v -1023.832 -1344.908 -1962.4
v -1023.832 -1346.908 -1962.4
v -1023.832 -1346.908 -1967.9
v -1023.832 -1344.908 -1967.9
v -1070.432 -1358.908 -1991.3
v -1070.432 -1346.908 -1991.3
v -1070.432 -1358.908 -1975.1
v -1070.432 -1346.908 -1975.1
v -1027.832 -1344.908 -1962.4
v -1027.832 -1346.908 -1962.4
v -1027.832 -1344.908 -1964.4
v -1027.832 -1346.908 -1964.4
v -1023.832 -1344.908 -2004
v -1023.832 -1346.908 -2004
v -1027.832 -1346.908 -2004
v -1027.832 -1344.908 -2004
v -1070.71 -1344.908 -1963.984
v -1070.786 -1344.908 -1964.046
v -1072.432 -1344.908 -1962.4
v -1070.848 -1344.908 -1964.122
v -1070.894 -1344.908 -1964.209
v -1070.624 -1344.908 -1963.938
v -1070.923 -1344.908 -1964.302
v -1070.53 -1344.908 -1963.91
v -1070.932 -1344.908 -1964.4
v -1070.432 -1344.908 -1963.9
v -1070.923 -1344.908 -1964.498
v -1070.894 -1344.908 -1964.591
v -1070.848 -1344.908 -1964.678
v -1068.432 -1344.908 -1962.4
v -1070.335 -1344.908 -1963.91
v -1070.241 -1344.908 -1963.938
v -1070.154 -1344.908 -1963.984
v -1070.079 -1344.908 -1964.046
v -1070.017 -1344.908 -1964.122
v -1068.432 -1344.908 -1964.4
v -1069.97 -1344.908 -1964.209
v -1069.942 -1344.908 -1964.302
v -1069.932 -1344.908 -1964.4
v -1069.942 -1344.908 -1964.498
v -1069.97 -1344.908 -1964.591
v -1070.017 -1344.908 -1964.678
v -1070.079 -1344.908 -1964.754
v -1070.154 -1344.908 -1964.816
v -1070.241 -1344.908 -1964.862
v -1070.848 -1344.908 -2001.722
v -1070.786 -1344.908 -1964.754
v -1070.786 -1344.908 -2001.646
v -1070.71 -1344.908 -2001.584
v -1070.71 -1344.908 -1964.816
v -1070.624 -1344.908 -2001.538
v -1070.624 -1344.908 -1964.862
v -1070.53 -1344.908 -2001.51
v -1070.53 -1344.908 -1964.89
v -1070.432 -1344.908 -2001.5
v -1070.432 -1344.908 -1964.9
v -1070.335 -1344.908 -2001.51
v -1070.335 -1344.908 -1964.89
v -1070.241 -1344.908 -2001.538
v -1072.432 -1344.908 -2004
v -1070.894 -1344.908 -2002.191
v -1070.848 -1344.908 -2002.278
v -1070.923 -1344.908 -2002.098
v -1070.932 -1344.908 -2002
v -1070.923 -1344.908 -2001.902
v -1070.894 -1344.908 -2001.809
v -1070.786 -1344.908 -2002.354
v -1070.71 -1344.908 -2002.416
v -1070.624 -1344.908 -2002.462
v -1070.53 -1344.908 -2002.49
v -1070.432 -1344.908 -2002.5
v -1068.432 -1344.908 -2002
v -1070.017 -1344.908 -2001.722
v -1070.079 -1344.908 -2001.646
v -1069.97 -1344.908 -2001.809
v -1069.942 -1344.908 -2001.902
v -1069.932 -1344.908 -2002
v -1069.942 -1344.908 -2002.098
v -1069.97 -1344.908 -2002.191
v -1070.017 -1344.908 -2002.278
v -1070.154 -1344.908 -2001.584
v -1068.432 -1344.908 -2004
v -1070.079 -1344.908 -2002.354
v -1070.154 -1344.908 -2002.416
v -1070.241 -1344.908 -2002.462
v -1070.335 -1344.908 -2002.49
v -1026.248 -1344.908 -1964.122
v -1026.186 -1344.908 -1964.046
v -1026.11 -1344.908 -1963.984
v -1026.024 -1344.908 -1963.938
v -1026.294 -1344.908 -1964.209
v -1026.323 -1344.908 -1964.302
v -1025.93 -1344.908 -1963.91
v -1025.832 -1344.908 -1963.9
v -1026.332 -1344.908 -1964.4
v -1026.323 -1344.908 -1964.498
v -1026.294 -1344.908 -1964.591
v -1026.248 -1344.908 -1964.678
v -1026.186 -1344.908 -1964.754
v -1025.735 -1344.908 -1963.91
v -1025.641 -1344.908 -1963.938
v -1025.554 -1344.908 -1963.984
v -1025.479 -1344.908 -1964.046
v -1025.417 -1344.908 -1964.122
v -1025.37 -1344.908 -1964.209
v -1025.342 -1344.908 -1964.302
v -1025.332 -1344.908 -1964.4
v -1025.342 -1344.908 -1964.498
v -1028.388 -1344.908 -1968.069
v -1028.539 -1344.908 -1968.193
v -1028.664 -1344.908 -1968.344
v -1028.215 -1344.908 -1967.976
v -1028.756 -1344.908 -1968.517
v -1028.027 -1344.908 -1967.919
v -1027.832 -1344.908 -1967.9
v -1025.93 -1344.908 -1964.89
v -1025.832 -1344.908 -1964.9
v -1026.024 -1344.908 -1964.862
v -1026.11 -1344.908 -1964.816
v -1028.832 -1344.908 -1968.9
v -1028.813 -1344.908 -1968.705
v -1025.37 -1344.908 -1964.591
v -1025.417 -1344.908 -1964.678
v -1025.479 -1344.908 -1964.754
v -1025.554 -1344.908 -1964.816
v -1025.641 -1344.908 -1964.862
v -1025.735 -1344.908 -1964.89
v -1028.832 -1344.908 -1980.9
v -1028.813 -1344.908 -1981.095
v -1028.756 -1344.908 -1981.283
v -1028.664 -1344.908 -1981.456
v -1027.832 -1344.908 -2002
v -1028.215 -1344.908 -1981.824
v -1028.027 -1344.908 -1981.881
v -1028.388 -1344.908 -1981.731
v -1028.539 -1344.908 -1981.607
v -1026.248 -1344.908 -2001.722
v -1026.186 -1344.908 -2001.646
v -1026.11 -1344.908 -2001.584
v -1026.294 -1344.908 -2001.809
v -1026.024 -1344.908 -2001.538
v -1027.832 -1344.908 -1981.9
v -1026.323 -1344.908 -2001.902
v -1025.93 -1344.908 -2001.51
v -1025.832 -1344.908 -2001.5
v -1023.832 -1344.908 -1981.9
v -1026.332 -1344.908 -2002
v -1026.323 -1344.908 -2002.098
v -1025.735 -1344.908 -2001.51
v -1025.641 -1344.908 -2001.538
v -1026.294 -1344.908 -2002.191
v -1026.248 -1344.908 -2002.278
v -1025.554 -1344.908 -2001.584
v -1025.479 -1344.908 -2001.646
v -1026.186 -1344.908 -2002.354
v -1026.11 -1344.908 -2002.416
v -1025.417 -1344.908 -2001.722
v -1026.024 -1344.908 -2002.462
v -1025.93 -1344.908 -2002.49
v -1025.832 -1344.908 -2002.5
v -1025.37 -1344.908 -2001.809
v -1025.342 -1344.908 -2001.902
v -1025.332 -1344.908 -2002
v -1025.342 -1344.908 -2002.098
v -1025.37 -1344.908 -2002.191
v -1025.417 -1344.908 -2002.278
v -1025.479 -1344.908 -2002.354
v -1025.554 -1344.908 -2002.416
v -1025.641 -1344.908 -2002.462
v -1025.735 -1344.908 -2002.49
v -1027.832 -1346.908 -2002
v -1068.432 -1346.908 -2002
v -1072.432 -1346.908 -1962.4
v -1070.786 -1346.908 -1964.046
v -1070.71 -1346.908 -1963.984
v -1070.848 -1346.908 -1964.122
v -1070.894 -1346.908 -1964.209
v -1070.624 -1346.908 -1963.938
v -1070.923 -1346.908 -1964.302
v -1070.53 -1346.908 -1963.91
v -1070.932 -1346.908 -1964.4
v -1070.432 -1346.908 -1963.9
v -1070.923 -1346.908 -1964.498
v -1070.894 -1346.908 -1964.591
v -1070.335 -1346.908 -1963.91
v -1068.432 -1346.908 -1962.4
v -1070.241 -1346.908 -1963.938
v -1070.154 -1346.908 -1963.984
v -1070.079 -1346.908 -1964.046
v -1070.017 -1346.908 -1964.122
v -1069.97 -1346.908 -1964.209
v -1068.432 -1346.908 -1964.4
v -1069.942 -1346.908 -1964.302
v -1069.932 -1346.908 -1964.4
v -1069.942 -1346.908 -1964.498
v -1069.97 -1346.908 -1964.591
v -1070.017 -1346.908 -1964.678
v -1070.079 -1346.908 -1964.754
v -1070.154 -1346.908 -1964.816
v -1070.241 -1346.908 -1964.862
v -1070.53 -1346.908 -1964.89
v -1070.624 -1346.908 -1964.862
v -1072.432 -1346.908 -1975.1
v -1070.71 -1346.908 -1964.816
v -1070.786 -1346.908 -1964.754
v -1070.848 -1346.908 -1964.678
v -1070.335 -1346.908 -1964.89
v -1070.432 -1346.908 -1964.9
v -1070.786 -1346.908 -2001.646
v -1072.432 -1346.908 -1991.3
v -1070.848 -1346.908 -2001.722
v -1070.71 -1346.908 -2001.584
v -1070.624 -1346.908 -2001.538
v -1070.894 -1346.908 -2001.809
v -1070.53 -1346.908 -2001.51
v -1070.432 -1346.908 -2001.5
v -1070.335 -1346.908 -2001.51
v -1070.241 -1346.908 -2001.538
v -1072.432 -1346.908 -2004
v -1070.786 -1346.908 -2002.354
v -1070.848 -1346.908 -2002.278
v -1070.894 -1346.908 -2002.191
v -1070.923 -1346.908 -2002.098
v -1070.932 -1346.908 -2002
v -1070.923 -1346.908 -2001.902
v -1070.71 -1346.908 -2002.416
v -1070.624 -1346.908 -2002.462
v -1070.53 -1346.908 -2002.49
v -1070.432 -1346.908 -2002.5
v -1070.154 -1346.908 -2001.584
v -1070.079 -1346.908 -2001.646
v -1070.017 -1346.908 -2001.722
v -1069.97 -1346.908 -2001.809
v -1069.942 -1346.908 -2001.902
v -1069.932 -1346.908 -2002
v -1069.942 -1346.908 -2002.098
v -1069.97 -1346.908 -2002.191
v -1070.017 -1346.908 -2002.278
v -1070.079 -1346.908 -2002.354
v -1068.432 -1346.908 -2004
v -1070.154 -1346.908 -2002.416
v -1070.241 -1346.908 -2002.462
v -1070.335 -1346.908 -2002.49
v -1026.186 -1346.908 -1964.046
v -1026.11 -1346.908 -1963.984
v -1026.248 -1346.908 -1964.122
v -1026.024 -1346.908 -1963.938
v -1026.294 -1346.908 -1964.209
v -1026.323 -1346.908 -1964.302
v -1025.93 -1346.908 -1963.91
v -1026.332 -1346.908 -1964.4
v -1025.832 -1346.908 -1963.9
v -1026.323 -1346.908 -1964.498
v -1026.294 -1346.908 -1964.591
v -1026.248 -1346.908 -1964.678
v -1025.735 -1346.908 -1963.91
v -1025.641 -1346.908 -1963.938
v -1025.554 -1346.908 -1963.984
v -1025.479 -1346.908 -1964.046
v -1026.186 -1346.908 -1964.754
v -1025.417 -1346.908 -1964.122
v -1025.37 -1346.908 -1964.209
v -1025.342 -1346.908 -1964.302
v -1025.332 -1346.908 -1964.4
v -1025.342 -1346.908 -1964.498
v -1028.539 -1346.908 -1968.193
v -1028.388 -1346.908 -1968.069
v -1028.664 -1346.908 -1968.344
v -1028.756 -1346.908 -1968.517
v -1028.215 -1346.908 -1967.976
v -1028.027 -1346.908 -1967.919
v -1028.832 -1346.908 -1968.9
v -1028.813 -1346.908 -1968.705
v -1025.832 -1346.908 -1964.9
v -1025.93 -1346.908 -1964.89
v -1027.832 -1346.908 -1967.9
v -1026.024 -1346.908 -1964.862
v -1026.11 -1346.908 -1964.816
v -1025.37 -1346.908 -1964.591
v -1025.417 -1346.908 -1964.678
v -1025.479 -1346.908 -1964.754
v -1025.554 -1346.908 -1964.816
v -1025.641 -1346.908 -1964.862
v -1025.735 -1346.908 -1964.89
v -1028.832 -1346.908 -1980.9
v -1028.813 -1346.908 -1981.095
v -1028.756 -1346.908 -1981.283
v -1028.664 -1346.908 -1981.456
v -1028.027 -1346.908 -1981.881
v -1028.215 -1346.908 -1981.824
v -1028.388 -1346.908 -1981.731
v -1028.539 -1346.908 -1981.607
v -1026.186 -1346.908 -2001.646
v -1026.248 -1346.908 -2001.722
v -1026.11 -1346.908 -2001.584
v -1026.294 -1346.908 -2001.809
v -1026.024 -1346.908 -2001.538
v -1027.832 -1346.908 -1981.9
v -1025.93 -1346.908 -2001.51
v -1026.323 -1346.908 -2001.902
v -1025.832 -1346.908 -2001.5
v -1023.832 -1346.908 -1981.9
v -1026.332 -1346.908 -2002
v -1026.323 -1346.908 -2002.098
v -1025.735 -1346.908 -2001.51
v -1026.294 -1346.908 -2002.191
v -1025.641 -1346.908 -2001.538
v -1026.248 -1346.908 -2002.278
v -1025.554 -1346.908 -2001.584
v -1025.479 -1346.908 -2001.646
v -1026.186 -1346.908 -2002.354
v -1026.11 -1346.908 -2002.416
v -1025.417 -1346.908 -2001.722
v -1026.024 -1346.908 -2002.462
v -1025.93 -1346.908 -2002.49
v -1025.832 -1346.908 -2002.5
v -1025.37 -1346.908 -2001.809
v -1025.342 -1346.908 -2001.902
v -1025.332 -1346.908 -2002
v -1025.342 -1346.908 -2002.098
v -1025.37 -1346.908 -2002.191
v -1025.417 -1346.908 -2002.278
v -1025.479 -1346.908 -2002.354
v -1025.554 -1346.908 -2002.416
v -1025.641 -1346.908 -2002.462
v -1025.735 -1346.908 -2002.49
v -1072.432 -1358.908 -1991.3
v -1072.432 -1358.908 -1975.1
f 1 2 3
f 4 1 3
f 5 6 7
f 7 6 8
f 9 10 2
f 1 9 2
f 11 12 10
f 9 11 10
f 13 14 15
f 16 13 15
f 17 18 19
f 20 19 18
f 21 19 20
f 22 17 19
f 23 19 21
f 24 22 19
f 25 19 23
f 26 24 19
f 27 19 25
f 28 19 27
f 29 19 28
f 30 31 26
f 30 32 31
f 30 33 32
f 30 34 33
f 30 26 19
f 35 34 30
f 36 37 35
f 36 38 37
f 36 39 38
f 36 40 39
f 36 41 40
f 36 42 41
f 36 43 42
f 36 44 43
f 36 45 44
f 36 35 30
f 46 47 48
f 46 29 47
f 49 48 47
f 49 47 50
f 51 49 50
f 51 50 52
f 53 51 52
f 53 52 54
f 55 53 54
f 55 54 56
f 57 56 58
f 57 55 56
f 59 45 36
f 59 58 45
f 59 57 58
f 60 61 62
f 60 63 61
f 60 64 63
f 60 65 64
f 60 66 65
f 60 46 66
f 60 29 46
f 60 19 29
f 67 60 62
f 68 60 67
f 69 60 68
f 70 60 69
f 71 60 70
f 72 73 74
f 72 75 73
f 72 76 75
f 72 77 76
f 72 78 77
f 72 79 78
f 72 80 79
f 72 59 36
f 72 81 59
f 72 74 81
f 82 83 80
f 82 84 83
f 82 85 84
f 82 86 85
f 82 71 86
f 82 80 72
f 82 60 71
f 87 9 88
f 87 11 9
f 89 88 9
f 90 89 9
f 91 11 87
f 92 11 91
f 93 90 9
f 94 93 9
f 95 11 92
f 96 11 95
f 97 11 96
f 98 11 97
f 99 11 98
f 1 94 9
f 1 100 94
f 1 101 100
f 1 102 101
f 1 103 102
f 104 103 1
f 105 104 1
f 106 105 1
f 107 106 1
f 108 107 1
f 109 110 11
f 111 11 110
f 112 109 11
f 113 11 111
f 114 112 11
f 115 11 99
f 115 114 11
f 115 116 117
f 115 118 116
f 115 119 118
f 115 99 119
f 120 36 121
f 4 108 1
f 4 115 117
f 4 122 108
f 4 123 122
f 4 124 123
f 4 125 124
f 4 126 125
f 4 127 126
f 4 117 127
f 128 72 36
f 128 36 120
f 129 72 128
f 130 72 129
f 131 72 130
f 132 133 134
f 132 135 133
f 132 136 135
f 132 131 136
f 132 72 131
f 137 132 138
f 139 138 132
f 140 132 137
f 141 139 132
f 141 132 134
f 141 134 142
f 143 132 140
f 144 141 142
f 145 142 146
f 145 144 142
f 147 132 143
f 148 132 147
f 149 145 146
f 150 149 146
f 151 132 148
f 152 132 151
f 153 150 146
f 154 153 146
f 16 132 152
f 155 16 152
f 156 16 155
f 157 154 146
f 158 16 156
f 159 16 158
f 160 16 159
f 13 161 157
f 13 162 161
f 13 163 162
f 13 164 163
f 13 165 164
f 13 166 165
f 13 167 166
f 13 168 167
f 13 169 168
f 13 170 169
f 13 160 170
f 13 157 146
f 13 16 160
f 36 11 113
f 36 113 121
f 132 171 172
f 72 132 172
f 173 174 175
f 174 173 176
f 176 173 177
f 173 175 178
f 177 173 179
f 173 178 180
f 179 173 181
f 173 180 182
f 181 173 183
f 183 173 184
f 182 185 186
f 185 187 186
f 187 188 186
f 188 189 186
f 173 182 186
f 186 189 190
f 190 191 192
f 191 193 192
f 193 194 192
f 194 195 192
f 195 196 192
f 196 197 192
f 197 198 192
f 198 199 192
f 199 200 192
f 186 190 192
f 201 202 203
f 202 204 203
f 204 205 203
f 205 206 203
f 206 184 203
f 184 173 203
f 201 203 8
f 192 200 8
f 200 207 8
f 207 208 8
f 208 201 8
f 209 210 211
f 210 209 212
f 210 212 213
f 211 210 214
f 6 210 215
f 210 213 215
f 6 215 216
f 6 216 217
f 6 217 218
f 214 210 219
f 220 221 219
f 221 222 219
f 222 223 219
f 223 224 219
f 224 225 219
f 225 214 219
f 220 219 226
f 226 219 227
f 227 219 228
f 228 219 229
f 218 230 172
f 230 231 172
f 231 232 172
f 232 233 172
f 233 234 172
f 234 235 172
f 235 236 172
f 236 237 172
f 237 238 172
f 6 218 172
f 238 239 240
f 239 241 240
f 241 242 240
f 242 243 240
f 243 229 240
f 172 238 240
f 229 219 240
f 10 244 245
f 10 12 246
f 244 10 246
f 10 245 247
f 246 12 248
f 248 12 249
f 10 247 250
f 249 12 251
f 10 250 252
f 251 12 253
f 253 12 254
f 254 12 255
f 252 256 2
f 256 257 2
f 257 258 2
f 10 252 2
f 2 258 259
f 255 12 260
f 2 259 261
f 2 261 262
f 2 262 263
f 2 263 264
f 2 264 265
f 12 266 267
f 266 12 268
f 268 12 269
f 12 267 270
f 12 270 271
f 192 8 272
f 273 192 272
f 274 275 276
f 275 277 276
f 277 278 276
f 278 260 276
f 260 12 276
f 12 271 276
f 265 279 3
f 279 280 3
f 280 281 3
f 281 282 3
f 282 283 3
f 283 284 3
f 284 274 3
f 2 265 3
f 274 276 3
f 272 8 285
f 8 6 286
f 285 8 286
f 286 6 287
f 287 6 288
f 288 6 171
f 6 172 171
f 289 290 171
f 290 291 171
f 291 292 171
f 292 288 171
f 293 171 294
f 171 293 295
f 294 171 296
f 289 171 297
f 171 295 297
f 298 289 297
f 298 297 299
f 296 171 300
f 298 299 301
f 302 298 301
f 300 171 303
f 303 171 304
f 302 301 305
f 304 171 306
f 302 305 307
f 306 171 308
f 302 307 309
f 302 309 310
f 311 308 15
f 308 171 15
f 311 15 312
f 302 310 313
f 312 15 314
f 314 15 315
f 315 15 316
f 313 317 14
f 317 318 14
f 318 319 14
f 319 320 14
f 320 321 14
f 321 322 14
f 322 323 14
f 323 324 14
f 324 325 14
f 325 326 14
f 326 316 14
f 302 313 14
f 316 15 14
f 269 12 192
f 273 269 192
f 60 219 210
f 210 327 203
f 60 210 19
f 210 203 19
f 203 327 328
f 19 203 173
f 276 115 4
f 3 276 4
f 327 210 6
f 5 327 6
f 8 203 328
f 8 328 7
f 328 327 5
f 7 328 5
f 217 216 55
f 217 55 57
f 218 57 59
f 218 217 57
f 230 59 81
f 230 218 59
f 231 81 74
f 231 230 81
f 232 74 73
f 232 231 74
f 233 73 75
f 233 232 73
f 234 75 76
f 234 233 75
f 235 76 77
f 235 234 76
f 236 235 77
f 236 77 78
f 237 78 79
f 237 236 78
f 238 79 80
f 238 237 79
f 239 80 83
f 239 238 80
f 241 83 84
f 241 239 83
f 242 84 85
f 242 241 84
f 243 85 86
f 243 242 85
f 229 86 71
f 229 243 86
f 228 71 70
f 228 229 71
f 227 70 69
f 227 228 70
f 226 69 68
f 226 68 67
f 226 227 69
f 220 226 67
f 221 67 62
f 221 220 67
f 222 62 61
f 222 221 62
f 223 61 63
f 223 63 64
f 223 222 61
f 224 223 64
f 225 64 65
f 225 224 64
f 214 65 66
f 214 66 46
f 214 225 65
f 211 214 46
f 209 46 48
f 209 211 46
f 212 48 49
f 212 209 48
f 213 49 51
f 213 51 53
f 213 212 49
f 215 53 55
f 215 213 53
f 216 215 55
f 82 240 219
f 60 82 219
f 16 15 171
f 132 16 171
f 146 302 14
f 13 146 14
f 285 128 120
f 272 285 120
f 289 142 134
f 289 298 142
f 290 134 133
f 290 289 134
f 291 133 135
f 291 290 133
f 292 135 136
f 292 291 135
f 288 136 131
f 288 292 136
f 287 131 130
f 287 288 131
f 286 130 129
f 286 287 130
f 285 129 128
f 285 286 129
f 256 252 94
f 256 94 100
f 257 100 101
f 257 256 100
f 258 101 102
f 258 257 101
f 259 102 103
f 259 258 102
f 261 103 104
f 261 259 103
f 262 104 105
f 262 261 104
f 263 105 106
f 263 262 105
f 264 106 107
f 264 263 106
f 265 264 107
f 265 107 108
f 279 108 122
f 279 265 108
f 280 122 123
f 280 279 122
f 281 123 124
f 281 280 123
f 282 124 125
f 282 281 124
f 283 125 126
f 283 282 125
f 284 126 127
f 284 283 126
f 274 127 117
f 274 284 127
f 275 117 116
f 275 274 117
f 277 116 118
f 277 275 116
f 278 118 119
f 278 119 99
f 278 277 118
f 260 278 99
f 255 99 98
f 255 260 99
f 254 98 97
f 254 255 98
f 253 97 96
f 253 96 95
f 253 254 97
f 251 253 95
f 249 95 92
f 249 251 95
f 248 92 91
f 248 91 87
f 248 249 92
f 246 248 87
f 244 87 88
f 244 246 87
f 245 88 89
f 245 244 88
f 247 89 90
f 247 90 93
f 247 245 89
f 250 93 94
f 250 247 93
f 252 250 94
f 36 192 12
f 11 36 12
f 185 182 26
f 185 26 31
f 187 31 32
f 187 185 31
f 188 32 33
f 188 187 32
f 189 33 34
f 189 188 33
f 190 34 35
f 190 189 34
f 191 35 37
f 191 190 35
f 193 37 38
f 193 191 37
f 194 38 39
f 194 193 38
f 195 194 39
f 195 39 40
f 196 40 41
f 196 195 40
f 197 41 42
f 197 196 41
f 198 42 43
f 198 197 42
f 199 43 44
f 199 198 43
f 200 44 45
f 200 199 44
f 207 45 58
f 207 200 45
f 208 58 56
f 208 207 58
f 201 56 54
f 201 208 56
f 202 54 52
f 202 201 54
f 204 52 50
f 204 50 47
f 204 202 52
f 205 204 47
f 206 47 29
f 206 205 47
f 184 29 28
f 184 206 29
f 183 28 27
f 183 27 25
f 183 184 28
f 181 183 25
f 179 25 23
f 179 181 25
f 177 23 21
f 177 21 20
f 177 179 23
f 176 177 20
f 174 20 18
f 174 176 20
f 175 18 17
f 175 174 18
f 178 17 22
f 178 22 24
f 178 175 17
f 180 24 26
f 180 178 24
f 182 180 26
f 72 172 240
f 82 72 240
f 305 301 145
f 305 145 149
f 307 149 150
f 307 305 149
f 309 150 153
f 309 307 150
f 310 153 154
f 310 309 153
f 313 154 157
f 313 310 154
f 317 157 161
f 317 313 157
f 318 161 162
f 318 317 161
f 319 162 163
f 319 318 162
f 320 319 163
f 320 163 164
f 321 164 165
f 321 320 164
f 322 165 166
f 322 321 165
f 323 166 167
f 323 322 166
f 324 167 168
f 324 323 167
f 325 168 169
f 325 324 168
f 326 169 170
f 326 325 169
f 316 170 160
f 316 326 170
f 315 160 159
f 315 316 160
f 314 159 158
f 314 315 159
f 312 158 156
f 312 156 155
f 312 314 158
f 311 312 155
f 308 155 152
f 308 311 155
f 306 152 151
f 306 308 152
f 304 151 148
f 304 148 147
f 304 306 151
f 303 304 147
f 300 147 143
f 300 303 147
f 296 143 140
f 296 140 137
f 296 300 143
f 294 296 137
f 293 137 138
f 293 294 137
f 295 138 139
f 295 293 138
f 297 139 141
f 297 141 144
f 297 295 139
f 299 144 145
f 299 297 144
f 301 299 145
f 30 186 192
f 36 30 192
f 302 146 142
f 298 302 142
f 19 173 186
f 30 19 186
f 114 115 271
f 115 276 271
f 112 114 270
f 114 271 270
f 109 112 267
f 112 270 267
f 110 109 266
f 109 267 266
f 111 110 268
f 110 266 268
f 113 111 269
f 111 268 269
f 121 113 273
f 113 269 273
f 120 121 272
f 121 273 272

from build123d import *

# Parameters (mm, degrees)
SKETCH1_R           = 0.5
BOSS_EXTRUDE1_DEPTH = 2
CUT_EXTRUDE1_DEPTH  = 2
FILLET1_R           = 1
SKETCH4_W           = 2
SKETCH4_H           = 16.2
BOSS_EXTRUDE2_DEPTH = 12


with BuildPart() as part:
    # Sketch1 → Boss-Extrude1 (new body)
    # profile 1 of 3: a face of its own
    with BuildSketch(Plane(origin=(0, -1346.908376945, 0), x_dir=(1, 0, 0), z_dir=(0, 1, 0))):
        Polygon((-1025.832273514, 2000), (-1025.832273514, 1981.9), (-1023.832273514, 1981.9), (-1023.832273514, 2004), (-1027.832273514, 2004), (-1027.832273514, 2002), (-1068.432273514, 2002), (-1068.432273514, 2004), (-1072.432273514, 2004), (-1072.432273514, 1991.5), (-1070.432273514, 1991.5), (-1070.432273514, 2000), align=None)
        with Locations(Location((-1070.432273514, 2002, 0), (0, 0, 270))):
            Circle(SKETCH1_R, mode=Mode.SUBTRACT)
        with Locations(Location((-1025.832273514, 2002, 0), (0, 0, 270))):
            Circle(SKETCH1_R, mode=Mode.SUBTRACT)
    # profile 2 of 3: a face of its own
    with BuildSketch(Plane(origin=(0, -1346.908376945, 0), x_dir=(1, 0, 0), z_dir=(0, 1, 0))):
        Polygon((-1023.832273514, 1981.9), (-1023.832273514, 1967.9), (-1025.832273514, 1967.9), (-1025.832273514, 1966.4), (-1070.432273514, 1966.4), (-1070.432273514, 1974.9), (-1072.432273514, 1974.9), (-1072.432273514, 1991.5), (-1070.432273514, 1991.5), (-1070.432273514, 2000), (-1025.832273514, 2000), (-1025.832273514, 1981.9), align=None)
    # profile 3 of 3: a face of its own
    with BuildSketch(Plane(origin=(0, -1346.908376945, 0), x_dir=(1, 0, 0), z_dir=(0, 1, 0))):
        Polygon((-1027.832273514, 1962.4), (-1023.832273514, 1962.4), (-1023.832273514, 1967.9), (-1025.832273514, 1967.9), (-1025.832273514, 1966.4), (-1070.432273514, 1966.4), (-1070.432273514, 1974.9), (-1072.432273514, 1974.9), (-1072.432273514, 1962.4), (-1068.432273514, 1962.4), (-1068.432273514, 1964.4), (-1027.832273514, 1964.4), align=None)
        with Locations(Location((-1025.832273514, 1964.4, 0), (0, 0, 270))):
            Circle(SKETCH1_R, mode=Mode.SUBTRACT)
        with Locations(Location((-1070.432273514, 1964.4, 0), (0, 0, 270))):
            Circle(SKETCH1_R, mode=Mode.SUBTRACT)
    extrude(amount=BOSS_EXTRUDE1_DEPTH)

    # Sketch3 → Cut-Extrude1 (cut)
    with BuildSketch(Plane(origin=(0, -1344.908376945, 0), x_dir=(1, 0, 0), z_dir=(0, 1, 0))):
        Polygon((-1028.832273514, 1967.9), (-1025.832273514, 1967.9), (-1023.832273514, 1967.9), (-1023.832273514, 1981.9), (-1025.832273514, 1981.9), (-1028.832273514, 1981.9), align=None)
    extrude(amount=-CUT_EXTRUDE1_DEPTH, mode=Mode.SUBTRACT)

    # Fillet1
    fillet1_edges = [part.edges().sort_by_distance(p)[0] for p in [
        (-1028.832273514, -1345.908376945, -1967.9),
        (-1028.832273514, -1345.908376945, -1981.9),
    ]]
    fillet(fillet1_edges, radius=FILLET1_R)

    # Sketch4 → Boss-Extrude2 (add)
    with BuildSketch(Plane.XZ.offset(1346.908376945)):
        with Locations((-1071.432273514, -1983.2)):
            Rectangle(SKETCH4_W, SKETCH4_H)
    extrude(amount=BOSS_EXTRUDE2_DEPTH)


solid = part.part
